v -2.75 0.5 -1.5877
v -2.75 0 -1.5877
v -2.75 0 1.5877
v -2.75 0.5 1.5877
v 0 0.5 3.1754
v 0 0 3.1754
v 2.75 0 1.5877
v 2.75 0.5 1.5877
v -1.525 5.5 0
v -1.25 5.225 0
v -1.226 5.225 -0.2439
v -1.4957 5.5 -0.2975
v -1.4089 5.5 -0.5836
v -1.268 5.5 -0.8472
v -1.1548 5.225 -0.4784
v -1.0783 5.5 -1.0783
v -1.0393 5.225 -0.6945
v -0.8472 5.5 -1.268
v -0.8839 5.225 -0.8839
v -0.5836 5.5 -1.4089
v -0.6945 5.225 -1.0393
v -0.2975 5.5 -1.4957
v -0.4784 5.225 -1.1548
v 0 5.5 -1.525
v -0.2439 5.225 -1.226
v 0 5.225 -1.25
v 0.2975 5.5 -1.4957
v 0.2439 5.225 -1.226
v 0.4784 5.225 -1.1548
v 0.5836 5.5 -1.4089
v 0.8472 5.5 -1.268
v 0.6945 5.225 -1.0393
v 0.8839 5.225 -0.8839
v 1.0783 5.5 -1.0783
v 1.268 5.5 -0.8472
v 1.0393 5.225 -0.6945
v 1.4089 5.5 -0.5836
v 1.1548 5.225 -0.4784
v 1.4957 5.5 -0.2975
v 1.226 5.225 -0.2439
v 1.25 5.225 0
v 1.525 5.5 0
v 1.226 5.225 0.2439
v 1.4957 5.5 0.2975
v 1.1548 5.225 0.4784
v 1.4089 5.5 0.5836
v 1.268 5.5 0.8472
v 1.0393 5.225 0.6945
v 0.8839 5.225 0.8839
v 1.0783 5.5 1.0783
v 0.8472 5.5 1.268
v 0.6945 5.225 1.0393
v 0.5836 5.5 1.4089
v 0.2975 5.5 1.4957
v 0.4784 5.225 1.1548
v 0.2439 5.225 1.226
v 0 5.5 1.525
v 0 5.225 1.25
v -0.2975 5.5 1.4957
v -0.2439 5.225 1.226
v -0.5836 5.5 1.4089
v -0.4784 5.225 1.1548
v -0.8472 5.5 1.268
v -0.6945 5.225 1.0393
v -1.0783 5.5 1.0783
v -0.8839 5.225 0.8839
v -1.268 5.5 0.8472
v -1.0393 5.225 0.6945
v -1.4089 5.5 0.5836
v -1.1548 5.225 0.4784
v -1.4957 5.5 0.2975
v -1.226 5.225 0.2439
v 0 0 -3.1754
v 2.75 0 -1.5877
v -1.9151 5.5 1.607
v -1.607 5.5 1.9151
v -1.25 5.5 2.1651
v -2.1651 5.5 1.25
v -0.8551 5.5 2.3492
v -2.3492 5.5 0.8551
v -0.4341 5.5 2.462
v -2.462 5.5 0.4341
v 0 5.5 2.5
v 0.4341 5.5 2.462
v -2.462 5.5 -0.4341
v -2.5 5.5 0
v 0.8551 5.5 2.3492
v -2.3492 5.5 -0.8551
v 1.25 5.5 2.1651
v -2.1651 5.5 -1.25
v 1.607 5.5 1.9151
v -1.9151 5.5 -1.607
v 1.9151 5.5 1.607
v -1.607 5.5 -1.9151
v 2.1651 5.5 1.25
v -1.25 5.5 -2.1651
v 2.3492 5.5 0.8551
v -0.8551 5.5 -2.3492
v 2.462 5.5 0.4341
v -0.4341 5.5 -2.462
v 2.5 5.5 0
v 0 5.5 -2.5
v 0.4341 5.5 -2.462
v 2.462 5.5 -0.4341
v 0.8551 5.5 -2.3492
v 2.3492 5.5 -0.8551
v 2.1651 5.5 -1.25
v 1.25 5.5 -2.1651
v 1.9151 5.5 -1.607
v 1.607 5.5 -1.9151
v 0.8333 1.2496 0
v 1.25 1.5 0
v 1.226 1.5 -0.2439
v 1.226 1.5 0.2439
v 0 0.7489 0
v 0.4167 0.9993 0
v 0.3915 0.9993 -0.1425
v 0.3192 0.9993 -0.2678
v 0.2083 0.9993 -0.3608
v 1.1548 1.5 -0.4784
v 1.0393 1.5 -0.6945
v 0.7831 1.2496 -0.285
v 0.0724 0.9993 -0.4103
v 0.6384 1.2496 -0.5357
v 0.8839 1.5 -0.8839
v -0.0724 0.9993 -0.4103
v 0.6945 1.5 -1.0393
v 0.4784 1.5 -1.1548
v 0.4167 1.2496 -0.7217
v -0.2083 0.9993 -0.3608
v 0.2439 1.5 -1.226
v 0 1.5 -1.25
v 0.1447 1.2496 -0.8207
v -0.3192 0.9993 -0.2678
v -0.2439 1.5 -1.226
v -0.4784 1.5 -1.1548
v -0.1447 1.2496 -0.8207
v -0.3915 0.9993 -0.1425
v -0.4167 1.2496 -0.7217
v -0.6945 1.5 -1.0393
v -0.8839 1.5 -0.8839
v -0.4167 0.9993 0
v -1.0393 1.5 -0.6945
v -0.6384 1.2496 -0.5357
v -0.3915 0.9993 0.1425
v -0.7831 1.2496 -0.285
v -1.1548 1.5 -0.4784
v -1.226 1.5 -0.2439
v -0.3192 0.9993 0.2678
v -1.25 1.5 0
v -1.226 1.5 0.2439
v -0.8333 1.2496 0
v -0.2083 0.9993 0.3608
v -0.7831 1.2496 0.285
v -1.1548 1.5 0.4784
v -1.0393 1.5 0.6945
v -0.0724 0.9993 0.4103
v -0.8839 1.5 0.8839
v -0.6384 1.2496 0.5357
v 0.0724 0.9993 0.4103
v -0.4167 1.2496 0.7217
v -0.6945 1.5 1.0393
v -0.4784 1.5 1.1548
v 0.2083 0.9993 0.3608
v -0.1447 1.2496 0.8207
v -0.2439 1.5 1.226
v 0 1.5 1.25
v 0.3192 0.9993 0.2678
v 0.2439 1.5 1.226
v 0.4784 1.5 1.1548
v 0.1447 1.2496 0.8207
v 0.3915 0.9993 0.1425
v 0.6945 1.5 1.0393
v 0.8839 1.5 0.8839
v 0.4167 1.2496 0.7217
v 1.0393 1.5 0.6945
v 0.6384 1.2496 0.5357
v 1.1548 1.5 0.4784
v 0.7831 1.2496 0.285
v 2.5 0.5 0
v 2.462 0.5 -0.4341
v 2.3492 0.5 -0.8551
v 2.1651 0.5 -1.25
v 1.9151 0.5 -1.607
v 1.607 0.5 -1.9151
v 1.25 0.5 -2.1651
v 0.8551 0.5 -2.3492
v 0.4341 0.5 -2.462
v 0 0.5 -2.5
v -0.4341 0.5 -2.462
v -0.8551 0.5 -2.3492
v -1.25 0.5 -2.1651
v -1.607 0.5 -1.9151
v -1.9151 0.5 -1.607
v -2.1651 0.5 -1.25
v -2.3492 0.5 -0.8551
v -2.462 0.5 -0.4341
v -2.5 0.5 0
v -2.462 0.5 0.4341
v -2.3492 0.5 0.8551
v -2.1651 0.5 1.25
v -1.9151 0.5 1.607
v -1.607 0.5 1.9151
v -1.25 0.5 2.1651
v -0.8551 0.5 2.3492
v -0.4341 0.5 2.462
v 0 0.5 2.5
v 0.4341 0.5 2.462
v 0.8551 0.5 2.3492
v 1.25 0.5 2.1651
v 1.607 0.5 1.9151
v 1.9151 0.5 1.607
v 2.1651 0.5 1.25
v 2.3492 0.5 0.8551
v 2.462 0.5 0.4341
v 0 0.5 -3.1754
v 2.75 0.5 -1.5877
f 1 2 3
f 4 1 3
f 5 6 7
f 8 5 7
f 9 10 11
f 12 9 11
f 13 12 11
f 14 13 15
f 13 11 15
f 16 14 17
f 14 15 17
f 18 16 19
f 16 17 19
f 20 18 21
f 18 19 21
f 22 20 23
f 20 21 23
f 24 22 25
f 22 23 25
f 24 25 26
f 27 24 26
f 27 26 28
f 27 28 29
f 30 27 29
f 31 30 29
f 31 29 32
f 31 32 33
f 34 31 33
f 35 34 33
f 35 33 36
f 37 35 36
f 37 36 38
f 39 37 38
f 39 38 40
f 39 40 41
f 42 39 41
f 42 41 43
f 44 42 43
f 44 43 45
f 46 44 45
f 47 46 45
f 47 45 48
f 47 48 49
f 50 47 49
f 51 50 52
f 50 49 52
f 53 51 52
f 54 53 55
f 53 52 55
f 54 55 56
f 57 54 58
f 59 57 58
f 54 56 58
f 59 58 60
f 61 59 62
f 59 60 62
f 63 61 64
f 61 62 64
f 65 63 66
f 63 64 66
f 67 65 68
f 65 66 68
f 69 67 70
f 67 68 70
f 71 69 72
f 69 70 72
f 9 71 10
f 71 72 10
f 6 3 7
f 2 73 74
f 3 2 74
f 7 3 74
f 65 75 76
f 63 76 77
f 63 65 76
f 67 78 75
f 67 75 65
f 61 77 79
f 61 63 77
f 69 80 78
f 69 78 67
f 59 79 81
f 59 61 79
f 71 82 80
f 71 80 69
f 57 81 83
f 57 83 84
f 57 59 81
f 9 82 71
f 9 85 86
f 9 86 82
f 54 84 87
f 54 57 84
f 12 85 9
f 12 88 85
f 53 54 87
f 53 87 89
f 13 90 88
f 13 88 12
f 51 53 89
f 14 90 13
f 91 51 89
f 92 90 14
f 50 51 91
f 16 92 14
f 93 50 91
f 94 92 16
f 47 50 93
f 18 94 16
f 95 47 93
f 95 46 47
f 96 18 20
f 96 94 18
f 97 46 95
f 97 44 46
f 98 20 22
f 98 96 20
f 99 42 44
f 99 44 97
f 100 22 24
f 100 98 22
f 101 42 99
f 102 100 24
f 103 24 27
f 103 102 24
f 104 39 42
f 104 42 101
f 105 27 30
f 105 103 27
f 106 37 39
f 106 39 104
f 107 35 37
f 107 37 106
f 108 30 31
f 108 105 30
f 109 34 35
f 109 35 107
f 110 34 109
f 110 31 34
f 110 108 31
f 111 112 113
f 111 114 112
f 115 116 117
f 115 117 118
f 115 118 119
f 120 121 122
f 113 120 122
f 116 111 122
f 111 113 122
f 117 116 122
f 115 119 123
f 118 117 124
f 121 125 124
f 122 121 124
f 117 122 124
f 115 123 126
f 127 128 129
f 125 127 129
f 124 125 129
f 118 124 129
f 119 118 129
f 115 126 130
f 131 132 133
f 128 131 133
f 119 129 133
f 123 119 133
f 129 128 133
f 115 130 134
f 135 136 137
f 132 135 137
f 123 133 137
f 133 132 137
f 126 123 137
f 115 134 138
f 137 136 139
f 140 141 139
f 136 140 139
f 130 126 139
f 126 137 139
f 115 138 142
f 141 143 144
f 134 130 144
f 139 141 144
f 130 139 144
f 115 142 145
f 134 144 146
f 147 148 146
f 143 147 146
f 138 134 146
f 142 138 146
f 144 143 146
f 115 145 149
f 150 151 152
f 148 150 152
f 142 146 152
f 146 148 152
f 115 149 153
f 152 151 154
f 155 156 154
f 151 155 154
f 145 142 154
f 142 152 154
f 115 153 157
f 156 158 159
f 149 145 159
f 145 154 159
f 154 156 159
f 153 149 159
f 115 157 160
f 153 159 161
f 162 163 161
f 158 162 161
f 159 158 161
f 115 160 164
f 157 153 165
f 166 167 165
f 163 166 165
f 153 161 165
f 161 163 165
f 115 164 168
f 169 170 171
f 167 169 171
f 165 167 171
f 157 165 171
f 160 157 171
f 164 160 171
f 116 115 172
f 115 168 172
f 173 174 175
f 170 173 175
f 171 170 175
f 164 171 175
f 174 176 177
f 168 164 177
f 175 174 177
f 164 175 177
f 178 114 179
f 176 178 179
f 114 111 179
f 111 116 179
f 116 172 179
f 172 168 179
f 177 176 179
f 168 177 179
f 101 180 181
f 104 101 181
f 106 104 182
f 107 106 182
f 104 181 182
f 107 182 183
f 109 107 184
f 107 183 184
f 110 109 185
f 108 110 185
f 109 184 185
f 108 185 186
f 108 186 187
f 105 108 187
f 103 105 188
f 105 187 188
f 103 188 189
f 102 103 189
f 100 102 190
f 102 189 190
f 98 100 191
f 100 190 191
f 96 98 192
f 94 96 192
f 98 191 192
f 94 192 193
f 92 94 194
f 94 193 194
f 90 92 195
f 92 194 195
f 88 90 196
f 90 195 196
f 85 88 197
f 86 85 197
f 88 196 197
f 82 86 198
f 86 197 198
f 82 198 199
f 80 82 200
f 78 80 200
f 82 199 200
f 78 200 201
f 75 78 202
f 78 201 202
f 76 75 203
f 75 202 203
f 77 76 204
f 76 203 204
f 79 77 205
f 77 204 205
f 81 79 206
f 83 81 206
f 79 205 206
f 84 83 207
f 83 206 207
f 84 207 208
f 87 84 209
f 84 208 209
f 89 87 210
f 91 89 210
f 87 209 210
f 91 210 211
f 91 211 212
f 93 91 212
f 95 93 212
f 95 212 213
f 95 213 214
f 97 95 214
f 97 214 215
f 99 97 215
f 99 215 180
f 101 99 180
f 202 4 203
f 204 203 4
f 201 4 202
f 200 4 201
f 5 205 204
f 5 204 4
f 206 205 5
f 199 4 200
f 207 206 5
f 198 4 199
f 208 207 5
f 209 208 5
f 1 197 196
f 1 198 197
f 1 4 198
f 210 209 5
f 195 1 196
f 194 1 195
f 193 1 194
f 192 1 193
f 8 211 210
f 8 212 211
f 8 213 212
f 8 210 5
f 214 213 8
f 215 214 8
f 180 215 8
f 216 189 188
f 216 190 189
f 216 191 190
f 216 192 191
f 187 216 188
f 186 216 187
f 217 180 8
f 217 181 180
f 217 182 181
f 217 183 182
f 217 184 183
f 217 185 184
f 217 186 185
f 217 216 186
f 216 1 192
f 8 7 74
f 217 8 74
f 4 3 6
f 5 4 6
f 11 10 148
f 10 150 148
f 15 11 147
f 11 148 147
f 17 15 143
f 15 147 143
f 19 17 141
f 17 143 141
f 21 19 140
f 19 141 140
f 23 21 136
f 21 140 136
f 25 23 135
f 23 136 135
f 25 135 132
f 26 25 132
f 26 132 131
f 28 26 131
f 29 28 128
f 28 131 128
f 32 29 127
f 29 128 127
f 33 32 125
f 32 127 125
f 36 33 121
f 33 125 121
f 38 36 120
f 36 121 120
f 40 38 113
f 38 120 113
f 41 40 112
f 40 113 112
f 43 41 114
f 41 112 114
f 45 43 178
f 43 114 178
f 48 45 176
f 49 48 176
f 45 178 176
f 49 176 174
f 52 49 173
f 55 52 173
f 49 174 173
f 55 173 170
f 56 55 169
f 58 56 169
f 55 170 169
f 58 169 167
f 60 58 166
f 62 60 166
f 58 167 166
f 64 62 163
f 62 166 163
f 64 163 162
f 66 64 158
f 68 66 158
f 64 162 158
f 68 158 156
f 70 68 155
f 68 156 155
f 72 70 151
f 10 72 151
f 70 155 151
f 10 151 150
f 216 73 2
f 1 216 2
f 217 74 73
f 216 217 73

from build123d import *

# Parameters (mm, degrees)
EXTRUDE_1_DEPTH              = 0.5
SKETCH_2_R                   = 2.5
EXTRUDE_2_DEPTH              = 5
HOLE_WIZARD_M3_1_D           = 2.5
HOLE_WIZARD_M3_1_DEPTH       = 4
HOLE_WIZARD_M3_1_CSINK_D     = 3.05
HOLE_WIZARD_M3_1_CSINK_ANGLE = 90
HOLE_WIZARD_M3_1_TIP         = 0.751075774


with BuildPart() as part:
    # 草图1 → 凸台-拉伸1 (new body)
    with BuildSketch(Plane(origin=(0, 0, 0), x_dir=(1, 0, 0), z_dir=(0, 1, 0))):
        Polygon((0, -3.175426481), (2.75, -1.58771324), (2.75, 1.58771324), (0, 3.175426481), (-2.75, 1.58771324), (-2.75, -1.58771324), align=None)
    extrude(amount=EXTRUDE_1_DEPTH)

    # 草图2 → 凸台-拉伸2 (add)
    with BuildSketch(Plane(origin=(0, 0.5, 0), x_dir=(1, 0, 0), z_dir=(0, 1, 0))):
        Circle(SKETCH_2_R)
    extrude(amount=EXTRUDE_2_DEPTH)

    # M3 螺纹孔1
    with Locations(Plane(origin=(0, 5.5, 0), x_dir=(1, 0, 0), z_dir=(0, 1, 0))):
        with Locations((0, 0)):
            CounterSinkHole(HOLE_WIZARD_M3_1_D / 2, HOLE_WIZARD_M3_1_CSINK_D / 2, depth=HOLE_WIZARD_M3_1_DEPTH, counter_sink_angle=HOLE_WIZARD_M3_1_CSINK_ANGLE)
            with Locations((0, 0, -(HOLE_WIZARD_M3_1_DEPTH + HOLE_WIZARD_M3_1_TIP / 2))):  # 118° drill point
                Cone(0, HOLE_WIZARD_M3_1_D / 2, HOLE_WIZARD_M3_1_TIP, mode=Mode.SUBTRACT)


solid = part.part
